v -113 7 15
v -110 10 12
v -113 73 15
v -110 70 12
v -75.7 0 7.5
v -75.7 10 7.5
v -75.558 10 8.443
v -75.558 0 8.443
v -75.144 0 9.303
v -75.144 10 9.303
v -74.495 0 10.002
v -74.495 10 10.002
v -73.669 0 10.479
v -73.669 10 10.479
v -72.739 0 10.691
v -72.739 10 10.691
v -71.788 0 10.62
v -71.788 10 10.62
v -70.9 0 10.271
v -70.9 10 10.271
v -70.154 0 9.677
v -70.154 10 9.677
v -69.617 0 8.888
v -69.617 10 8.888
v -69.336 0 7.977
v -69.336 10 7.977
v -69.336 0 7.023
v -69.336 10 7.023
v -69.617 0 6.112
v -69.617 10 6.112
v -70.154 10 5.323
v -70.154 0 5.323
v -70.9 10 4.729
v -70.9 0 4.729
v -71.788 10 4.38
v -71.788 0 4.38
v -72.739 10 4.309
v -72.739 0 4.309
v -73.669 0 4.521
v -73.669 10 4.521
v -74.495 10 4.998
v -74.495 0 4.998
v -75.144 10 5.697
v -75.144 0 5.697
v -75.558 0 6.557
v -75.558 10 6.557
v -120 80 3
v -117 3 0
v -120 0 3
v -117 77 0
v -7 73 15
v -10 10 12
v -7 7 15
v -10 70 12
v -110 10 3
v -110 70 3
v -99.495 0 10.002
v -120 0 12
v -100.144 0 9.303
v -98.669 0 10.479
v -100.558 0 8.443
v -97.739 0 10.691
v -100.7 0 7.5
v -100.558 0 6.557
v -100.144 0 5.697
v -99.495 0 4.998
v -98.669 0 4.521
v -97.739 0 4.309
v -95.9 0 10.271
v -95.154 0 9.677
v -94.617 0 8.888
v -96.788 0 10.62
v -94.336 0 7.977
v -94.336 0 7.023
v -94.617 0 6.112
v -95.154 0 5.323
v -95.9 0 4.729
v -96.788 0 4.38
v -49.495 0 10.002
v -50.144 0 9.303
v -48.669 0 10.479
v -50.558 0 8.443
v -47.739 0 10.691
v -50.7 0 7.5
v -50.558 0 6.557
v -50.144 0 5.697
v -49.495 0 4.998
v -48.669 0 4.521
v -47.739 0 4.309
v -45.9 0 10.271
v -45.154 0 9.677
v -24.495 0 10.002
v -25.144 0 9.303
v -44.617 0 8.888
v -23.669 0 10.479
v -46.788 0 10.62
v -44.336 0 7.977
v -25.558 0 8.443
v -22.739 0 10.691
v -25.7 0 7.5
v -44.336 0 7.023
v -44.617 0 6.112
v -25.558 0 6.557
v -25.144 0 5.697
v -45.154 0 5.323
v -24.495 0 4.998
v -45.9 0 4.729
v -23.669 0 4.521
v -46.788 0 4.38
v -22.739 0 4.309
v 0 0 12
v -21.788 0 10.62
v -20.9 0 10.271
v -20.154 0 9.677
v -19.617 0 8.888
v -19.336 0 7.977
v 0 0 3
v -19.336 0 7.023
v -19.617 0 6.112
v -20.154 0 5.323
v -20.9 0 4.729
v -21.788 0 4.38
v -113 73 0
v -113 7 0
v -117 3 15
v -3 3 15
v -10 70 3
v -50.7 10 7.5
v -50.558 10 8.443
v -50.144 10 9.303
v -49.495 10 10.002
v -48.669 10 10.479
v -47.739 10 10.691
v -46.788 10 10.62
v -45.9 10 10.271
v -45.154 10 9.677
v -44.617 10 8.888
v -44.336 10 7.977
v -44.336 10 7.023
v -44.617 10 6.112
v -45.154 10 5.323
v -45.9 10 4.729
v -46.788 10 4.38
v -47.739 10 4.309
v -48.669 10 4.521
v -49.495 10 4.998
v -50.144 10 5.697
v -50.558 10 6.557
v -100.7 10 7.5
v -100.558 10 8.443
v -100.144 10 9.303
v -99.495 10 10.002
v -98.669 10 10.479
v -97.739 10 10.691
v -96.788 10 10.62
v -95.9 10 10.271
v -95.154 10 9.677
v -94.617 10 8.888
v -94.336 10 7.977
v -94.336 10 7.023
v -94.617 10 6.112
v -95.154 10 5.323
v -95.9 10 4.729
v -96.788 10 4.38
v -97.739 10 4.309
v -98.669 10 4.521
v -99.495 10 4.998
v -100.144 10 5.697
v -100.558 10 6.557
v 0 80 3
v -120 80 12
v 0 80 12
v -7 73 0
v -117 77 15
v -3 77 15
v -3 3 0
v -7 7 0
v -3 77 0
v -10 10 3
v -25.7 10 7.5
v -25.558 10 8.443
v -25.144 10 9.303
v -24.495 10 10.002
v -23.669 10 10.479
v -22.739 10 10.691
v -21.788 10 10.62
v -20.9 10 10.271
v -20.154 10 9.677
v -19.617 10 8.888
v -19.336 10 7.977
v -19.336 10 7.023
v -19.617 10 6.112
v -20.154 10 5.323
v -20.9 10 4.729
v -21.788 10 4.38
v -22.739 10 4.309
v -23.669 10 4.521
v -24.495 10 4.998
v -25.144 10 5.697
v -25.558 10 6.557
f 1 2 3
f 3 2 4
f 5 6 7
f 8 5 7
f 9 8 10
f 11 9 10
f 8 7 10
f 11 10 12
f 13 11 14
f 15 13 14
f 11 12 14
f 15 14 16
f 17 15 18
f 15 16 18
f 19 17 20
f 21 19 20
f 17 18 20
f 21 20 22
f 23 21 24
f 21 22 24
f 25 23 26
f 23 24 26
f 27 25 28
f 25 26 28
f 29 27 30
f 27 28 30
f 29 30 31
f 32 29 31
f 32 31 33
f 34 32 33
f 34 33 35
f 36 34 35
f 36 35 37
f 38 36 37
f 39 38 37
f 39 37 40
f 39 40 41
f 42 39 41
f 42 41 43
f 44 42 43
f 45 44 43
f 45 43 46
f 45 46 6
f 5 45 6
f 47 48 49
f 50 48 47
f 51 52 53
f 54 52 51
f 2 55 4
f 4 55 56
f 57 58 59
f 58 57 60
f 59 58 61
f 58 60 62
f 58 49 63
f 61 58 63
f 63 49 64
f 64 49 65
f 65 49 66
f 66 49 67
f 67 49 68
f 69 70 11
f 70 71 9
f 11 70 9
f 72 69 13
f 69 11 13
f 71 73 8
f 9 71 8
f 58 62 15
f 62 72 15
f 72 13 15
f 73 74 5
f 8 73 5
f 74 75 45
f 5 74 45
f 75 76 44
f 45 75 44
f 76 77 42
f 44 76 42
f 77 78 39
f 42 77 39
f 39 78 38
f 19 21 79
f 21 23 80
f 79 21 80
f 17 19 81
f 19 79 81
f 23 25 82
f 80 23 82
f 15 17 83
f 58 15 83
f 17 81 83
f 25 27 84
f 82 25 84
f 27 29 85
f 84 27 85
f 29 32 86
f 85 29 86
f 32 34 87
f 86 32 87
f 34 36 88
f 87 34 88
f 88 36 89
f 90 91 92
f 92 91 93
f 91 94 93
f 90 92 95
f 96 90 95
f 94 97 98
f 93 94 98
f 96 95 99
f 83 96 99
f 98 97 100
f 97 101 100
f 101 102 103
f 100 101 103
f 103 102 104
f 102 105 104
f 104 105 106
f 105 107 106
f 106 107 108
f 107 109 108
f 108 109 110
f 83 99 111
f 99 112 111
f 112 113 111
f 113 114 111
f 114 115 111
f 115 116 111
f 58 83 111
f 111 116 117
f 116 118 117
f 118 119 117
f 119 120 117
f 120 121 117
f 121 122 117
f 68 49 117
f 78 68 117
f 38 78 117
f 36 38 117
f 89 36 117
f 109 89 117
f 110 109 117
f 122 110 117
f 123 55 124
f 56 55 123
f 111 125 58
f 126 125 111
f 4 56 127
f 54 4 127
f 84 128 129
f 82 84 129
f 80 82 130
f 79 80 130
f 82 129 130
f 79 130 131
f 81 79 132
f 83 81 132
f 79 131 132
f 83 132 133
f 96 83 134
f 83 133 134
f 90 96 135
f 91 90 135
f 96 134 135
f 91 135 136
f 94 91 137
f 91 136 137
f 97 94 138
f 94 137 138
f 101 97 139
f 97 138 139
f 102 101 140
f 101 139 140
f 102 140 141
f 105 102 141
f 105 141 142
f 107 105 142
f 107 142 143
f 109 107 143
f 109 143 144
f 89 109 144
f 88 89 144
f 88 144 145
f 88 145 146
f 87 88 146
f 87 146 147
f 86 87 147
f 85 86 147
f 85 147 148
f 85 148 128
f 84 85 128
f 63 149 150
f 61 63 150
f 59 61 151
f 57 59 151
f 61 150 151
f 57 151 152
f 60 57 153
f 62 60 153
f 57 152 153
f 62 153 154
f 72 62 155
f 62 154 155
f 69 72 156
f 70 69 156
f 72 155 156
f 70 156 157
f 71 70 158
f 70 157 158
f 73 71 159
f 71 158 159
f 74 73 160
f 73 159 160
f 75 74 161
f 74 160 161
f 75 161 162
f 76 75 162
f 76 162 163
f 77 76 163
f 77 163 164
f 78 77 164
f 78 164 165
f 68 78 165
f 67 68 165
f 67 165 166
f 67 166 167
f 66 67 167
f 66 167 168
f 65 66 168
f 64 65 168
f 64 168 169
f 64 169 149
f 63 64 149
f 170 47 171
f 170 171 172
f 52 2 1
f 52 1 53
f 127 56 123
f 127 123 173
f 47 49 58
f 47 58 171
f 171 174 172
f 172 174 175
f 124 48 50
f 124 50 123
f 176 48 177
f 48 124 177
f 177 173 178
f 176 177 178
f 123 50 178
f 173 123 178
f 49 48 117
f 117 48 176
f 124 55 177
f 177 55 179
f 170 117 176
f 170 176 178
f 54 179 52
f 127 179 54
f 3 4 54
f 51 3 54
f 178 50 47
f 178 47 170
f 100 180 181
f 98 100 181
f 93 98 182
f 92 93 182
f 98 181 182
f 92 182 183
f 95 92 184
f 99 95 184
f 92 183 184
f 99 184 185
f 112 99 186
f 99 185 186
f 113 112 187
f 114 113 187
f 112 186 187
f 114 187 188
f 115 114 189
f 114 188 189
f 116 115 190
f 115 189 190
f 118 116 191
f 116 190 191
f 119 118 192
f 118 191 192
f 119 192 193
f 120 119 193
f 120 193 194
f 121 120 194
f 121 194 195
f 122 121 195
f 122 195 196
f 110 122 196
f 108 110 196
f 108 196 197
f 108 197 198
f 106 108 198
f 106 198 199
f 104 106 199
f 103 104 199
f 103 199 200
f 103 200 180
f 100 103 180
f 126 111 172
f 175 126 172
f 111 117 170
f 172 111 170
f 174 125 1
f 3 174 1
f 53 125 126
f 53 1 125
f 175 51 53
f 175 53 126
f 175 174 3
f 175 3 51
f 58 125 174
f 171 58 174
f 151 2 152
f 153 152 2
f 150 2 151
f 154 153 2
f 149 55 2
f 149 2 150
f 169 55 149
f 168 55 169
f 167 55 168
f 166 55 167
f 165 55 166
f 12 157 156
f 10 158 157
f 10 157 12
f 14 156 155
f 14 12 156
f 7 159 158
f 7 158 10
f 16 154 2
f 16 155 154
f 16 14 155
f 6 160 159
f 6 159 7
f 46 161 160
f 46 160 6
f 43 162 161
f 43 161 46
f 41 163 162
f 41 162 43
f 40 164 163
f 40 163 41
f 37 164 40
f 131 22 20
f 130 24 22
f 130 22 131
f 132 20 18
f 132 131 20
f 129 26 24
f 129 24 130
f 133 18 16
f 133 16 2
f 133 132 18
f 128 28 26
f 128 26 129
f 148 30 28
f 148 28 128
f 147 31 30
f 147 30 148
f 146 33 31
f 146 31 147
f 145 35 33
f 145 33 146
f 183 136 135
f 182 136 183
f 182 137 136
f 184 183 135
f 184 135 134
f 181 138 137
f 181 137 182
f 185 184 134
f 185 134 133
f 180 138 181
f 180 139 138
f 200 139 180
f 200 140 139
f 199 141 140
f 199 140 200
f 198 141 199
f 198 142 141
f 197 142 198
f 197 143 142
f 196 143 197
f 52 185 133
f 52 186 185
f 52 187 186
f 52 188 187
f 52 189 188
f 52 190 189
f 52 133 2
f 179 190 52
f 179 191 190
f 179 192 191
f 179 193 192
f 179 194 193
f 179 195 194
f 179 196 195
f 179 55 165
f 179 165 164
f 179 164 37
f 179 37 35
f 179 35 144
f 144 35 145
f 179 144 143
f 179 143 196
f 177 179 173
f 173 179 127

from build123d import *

# Parameters (mm, degrees)
F0_W     = 120
F0_H     = 80
F0_W_2   = 100
F0_H_2   = 60
F1_DEPTH = 15
F2_R     = 3.2
F3_DEPTH = 10.001
F4_SIZE  = 3


with BuildPart() as f1:
    # F0 (on Top) → F1 (new body)
    with BuildSketch(Plane.XY):
        with Locations((-60, 40)):
            Rectangle(F0_W, F0_H)
        with Locations((-60, 40)):
            Rectangle(F0_W_2, F0_H_2, mode=Mode.SUBTRACT)
    extrude(amount=F1_DEPTH)

    # F2 (on face) → F3 (cut, through all)
    with BuildSketch(Plane(origin=(0, 10, 0), x_dir=(-1, 0, 0), z_dir=(0, 1, 0))):
        with Locations((72.5, 7.5)):
            Circle(F2_R)
        with Locations((47.5, 7.5)):
            Circle(F2_R)
        with Locations((97.5, 7.5)):
            Circle(F2_R)
        with Locations((22.5, 7.5)):
            Circle(F2_R)
    extrude(amount=-F3_DEPTH, mode=Mode.SUBTRACT)

    # F4
    f4_edges = [f1.edges().sort_by_distance(p)[0] for p in [
        (-60, 0, 15),
        (0, 40, 15),
        (-60, 80, 15),
        (-120, 40, 15),
        (-10, 40, 15),
        (-60, 10, 15),
        (-110, 40, 15),
        (-60, 70, 15),
        (-60, 0, 0),
        (0, 40, 0),
        (-60, 80, 0),
        (-120, 40, 0),
        (-10, 40, 0),
        (-60, 10, 0),
        (-110, 40, 0),
        (-60, 70, 0),
    ]]
    chamfer(f4_edges, length=F4_SIZE)


solid = f1.part
